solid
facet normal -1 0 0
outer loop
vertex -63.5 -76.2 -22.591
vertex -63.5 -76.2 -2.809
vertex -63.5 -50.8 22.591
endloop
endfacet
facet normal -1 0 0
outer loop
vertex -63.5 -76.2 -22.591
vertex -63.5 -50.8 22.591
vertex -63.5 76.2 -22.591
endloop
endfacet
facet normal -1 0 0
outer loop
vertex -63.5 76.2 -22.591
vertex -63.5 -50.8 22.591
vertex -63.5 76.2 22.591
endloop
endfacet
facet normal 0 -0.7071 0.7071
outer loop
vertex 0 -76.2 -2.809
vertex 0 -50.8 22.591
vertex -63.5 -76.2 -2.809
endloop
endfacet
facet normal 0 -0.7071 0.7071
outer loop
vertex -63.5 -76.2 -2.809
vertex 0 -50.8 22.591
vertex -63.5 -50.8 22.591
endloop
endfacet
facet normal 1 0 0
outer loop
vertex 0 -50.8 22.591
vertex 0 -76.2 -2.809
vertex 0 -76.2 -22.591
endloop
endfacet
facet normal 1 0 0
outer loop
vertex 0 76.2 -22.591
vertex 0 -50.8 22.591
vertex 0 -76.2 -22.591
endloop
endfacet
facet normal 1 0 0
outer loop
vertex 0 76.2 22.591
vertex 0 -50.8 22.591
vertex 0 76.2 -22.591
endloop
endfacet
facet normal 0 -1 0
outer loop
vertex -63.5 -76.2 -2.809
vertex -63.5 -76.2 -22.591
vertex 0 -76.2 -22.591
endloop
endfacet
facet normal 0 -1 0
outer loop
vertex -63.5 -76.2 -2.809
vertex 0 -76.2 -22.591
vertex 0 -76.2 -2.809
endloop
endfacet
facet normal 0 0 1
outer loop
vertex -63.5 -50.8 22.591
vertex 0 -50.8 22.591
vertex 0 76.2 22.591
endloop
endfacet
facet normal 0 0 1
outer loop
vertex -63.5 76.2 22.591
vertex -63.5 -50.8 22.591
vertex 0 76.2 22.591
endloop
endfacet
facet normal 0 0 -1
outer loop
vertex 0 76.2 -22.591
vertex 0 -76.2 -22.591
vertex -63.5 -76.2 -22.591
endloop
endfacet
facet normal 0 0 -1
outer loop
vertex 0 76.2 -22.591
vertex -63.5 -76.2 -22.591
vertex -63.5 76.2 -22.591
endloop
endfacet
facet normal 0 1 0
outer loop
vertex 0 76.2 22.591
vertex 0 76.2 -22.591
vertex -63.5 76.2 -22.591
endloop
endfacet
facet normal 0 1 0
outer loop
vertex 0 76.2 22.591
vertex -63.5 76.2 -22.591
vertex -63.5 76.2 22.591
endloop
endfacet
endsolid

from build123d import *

# Parameters (mm, degrees)
F0_W     = 152.4
F0_H     = 45.182696
F1_DEPTH = 63.5
F2_SIZE  = 25.4


with BuildPart() as f1:
    # F0 (on Right) → F1 (new body)
    with BuildSketch(Plane.YZ):
        Rectangle(F0_W, F0_H)
    extrude(amount=-F1_DEPTH)

    # F2
    f2_edges = [f1.edges().sort_by_distance(p)[0] for p in [
        (-31.75, -76.2, 22.591348),
    ]]
    chamfer(f2_edges, length=F2_SIZE)


solid = f1.part
